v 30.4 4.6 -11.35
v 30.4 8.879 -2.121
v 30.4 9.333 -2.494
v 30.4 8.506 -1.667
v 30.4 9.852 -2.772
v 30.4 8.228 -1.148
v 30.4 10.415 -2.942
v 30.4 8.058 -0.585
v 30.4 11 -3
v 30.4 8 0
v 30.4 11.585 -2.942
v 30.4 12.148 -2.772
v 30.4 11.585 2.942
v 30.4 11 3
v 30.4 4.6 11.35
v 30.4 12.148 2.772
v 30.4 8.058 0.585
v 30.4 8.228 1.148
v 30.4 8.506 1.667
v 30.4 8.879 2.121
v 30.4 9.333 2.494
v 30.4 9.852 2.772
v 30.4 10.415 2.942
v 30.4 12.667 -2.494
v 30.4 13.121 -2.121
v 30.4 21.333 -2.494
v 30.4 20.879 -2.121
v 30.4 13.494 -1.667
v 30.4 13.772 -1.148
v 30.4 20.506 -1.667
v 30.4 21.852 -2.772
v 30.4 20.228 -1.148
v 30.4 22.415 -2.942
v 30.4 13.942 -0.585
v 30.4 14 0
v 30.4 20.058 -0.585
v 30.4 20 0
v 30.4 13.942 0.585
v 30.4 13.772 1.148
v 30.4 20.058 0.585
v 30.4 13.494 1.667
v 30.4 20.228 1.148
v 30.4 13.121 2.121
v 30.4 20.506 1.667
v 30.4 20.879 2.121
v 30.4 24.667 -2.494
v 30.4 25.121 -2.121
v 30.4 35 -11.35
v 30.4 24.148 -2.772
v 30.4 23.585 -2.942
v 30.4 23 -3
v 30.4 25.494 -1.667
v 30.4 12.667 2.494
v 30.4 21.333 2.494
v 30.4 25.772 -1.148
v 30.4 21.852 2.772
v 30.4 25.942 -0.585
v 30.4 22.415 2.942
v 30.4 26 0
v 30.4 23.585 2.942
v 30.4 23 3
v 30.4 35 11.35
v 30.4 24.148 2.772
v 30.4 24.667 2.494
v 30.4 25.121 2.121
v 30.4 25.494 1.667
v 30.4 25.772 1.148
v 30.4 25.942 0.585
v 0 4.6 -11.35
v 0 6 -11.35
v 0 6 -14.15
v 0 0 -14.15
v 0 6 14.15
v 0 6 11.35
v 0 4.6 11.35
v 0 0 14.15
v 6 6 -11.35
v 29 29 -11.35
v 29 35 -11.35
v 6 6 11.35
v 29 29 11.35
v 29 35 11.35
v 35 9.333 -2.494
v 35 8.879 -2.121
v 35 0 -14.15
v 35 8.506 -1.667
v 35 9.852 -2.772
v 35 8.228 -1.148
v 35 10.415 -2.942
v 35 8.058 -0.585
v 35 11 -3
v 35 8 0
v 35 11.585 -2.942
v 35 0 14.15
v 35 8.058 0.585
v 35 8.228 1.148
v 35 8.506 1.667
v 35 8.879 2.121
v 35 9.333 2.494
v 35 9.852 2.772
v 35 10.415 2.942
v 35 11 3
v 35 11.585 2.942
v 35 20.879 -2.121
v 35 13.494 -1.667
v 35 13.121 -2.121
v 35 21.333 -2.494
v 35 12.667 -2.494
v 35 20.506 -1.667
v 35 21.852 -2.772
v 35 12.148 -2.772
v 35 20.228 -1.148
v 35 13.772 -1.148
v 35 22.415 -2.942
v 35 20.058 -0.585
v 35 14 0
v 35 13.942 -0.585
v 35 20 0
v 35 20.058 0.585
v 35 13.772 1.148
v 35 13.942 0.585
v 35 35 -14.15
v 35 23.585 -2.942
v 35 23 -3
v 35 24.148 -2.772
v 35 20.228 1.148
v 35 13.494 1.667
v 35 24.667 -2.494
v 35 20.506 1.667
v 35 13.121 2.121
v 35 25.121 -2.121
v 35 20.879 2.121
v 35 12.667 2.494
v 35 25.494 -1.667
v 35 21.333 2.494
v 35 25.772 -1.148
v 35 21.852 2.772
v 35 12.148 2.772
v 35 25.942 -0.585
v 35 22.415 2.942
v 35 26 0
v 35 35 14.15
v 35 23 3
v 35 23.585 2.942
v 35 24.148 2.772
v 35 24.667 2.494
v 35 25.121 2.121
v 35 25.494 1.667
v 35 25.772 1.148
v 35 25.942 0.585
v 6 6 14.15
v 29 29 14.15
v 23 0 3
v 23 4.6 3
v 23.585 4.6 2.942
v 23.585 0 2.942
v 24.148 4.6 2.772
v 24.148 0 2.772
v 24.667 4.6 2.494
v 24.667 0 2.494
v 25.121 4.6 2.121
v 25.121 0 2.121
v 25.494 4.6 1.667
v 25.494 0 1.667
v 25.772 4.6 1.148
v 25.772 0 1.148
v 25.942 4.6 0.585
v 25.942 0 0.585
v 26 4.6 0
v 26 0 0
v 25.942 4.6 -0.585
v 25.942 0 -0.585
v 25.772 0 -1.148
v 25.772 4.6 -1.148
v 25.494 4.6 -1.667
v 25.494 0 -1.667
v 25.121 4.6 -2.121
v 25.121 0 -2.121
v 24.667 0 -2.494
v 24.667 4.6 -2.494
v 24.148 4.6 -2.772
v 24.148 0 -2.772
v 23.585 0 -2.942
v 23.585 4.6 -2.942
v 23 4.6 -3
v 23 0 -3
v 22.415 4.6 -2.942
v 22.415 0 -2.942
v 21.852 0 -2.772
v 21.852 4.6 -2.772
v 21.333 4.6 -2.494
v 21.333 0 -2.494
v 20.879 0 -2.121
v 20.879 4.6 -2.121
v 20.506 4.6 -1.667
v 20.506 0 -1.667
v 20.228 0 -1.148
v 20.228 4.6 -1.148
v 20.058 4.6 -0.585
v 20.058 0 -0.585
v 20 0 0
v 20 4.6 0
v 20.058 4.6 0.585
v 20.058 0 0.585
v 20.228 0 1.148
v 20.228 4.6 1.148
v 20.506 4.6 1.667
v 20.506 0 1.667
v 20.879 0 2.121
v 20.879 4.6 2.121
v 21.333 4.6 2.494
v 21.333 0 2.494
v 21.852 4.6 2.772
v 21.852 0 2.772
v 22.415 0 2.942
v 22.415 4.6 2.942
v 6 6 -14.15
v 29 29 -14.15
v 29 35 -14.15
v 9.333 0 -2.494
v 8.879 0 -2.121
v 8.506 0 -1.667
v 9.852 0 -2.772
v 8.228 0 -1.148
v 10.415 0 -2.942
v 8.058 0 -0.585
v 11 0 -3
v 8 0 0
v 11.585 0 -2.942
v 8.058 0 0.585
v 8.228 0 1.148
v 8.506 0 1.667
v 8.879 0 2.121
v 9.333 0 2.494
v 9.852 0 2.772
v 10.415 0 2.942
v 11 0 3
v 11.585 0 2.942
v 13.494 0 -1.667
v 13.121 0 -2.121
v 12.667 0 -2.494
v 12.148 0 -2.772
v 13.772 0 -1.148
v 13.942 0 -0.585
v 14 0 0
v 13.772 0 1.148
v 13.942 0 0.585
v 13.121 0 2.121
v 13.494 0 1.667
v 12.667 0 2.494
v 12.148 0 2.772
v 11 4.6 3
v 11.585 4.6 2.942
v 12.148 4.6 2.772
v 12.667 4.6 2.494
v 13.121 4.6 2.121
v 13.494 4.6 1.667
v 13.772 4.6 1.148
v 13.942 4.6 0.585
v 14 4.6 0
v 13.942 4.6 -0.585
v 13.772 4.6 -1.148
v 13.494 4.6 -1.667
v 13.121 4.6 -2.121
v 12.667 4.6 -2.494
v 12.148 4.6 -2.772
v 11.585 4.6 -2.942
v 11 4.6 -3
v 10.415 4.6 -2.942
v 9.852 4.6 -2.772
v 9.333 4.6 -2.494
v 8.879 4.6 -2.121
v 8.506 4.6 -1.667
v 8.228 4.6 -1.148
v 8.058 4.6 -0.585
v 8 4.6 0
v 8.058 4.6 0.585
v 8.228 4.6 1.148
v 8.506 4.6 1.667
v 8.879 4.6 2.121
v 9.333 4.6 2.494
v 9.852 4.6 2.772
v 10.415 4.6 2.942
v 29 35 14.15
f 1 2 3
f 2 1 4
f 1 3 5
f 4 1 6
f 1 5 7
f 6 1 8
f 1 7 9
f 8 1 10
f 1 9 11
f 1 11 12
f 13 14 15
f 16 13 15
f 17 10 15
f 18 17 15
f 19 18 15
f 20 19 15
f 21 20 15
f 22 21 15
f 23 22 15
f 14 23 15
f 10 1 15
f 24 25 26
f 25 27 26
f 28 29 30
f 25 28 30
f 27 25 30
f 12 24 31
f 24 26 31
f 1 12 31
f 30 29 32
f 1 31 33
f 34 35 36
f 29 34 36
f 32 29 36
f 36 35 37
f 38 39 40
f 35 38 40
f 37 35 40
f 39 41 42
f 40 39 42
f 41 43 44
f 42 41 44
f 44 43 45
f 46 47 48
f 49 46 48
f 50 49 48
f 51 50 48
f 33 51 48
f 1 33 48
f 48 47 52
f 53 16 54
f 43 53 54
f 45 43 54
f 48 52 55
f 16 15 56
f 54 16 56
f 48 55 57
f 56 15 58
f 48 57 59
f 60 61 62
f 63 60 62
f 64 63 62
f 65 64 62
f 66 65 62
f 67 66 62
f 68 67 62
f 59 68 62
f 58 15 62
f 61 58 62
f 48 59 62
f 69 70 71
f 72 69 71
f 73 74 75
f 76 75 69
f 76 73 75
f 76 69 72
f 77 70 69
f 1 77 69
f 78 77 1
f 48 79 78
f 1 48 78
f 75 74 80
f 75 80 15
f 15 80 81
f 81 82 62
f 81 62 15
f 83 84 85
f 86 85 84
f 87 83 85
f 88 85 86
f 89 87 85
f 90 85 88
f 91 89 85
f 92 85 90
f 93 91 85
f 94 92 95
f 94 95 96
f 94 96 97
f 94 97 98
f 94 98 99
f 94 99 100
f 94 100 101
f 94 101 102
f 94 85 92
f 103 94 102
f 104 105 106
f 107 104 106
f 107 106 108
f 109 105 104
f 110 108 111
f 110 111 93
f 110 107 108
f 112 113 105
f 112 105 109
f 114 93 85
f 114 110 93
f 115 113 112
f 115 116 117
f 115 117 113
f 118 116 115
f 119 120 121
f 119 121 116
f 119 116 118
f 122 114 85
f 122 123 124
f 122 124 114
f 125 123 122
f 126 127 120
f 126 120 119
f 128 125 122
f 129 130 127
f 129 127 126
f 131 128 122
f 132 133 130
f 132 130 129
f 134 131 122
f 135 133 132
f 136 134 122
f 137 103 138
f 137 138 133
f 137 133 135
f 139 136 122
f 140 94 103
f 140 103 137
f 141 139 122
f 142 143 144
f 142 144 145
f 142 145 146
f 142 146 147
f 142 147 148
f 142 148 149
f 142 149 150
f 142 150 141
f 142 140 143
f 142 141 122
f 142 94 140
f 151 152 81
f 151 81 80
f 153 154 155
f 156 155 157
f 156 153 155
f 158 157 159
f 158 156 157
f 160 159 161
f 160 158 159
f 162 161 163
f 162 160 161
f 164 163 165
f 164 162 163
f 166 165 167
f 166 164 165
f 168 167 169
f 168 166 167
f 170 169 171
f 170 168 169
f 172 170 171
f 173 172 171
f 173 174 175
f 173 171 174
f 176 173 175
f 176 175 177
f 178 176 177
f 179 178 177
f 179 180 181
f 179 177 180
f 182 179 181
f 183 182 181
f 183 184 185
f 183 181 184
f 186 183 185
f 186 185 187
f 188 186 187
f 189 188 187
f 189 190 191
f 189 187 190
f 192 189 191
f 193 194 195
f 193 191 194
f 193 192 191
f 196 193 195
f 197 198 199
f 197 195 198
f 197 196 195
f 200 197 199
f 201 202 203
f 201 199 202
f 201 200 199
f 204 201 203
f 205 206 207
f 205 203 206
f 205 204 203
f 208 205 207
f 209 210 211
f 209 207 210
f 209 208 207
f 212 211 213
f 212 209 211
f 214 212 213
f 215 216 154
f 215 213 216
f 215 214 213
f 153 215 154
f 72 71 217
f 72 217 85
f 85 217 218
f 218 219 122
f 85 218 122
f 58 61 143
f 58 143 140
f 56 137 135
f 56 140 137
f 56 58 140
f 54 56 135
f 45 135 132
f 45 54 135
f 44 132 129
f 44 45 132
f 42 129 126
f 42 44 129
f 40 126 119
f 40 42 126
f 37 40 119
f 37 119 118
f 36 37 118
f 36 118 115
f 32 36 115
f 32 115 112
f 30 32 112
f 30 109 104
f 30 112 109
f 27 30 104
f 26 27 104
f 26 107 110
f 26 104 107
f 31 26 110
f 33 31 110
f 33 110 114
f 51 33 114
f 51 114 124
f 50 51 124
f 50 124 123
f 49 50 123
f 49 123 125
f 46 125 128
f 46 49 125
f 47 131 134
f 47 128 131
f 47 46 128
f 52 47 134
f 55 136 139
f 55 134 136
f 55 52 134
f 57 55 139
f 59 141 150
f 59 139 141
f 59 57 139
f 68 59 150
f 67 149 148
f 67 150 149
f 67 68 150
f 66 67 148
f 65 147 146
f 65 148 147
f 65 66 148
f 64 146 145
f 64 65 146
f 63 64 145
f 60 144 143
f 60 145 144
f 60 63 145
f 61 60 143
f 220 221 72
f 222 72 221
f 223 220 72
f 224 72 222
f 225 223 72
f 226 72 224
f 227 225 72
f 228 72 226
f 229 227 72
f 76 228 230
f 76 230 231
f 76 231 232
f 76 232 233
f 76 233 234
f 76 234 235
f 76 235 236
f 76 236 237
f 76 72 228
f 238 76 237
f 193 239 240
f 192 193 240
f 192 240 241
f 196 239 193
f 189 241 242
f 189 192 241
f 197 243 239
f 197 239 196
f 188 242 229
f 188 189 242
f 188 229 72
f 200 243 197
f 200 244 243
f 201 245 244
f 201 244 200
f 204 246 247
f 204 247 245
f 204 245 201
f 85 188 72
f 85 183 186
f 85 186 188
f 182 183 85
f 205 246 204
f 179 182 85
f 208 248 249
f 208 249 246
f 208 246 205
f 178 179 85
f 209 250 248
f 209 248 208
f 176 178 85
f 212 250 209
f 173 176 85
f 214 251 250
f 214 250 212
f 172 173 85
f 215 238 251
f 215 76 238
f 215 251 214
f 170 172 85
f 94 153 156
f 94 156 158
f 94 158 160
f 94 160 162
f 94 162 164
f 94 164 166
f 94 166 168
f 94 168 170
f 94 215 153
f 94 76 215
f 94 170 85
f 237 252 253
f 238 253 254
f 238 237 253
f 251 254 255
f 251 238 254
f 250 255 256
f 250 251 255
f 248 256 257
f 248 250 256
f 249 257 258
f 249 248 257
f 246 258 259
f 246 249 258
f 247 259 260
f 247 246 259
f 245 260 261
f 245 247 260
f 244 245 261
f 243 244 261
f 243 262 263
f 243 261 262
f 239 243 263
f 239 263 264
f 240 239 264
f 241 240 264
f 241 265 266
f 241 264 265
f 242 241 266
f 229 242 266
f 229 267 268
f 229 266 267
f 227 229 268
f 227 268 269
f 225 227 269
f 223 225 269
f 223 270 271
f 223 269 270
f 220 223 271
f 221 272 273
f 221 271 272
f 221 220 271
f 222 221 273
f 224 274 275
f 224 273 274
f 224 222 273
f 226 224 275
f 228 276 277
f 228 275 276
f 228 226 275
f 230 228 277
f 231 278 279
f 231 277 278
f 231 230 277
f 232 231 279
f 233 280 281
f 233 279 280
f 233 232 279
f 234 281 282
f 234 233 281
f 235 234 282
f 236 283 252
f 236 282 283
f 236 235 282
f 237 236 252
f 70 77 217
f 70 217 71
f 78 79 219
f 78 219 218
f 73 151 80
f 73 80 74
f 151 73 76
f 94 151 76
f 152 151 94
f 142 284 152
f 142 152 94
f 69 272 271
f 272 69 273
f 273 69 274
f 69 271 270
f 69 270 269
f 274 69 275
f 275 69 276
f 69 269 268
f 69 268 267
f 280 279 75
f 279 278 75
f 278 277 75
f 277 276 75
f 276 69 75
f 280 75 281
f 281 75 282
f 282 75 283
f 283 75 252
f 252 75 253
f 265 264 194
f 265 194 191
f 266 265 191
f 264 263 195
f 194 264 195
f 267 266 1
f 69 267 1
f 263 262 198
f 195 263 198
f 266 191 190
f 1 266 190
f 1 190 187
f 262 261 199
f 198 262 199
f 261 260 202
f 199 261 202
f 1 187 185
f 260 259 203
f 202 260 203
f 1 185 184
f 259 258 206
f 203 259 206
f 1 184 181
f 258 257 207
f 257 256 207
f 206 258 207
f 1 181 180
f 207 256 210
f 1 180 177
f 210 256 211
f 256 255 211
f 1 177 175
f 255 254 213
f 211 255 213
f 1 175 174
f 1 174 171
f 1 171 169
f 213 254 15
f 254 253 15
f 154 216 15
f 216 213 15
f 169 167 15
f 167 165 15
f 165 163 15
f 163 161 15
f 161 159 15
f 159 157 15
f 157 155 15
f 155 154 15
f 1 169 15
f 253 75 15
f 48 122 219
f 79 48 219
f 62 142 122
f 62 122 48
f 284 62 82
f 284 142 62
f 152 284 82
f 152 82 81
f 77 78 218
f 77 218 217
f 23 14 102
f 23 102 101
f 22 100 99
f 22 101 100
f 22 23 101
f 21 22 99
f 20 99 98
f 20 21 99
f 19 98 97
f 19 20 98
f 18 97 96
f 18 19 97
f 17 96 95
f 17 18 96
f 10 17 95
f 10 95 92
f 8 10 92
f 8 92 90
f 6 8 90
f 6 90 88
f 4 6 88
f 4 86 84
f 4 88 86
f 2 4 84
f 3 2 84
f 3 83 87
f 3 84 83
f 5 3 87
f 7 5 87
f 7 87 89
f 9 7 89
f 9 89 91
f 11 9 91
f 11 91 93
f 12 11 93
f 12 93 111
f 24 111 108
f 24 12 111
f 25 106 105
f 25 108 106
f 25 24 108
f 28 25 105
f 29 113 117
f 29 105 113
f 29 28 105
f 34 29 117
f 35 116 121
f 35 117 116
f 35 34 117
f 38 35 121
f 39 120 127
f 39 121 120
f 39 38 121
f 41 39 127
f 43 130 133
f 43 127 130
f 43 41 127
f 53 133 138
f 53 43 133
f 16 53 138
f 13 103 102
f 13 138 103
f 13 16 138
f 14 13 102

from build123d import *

# Parameters (mm, degrees)
EXTRUDE_1_DEPTH     = 14.15
SKETCH_2_W          = 30.4
SKETCH_2_H          = 30.4
CUT_EXTRUDE_1_DEPTH = 11.35
CUT_EXTRUDE_2_REACH = 53.48
SKETCH_4_R          = 3
CUT_EXTRUDE_3_REACH = 53.48
SKETCH_5_R          = 3


with BuildPart() as part:
    # 草图1 → 凸台-拉伸1 (new, symmetric)
    with BuildSketch(Plane.XY):
        Polygon((0, 0), (35, 0), (35, 35), (29, 35), (29, 29), (6, 6), (0, 6), align=None)
    extrude(amount=EXTRUDE_1_DEPTH, both=True)

    # 草图2 → 切除-拉伸1 (cut, symmetric)
    with BuildSketch(Plane.XY):
        with Locations((15.2, 19.8)):
            Rectangle(SKETCH_2_W, SKETCH_2_H)
    extrude(amount=CUT_EXTRUDE_1_DEPTH, both=True, mode=Mode.SUBTRACT)

    # 草图4 → 切除-拉伸2 (cut, up to next)
    with BuildSketch(Plane(origin=(0, 0, 0), x_dir=(1, 0, 0), z_dir=(0, 1, 0)), mode=Mode.PRIVATE) as cut_extrude_2_sk1:
        with Locations(Location((23, 0, 0), (0, 0, 270))):
            Circle(SKETCH_4_R)
    cut_extrude_2_tool1 = extrude(cut_extrude_2_sk1.sketch, amount=CUT_EXTRUDE_2_REACH, mode=Mode.PRIVATE) & part.part
    # 草图4 → 切除-拉伸2 (cut, up to next)
    with BuildSketch(Plane(origin=(0, 0, 0), x_dir=(1, 0, 0), z_dir=(0, 1, 0)), mode=Mode.PRIVATE) as cut_extrude_2_sk2:
        with Locations(Location((11, 0, 0), (0, 0, 270))):
            Circle(SKETCH_4_R)
    cut_extrude_2_tool2 = extrude(cut_extrude_2_sk2.sketch, amount=CUT_EXTRUDE_2_REACH, mode=Mode.PRIVATE) & part.part
    add(cut_extrude_2_tool1.solids().sort_by_distance((23, 0, 0))[0], mode=Mode.SUBTRACT)
    add(cut_extrude_2_tool2.solids().sort_by_distance((11, 0, 0))[0], mode=Mode.SUBTRACT)

    # 草图5 → 切除-拉伸3 (cut, up to next)
    with BuildSketch(Plane(origin=(0, 0, 0), x_dir=(0, 0, -1), z_dir=(1, 0, 0)), mode=Mode.PRIVATE) as cut_extrude_3_sk1:
        with Locations(Location((0, 23, 0), (0, 0, 180))):
            Circle(SKETCH_5_R)
    cut_extrude_3_tool1 = extrude(cut_extrude_3_sk1.sketch, amount=CUT_EXTRUDE_3_REACH, mode=Mode.PRIVATE) & part.part
    # 草图5 → 切除-拉伸3 (cut, up to next)
    with BuildSketch(Plane(origin=(0, 0, 0), x_dir=(0, 0, -1), z_dir=(1, 0, 0)), mode=Mode.PRIVATE) as cut_extrude_3_sk2:
        with Locations(Location((0, 11, 0), (0, 0, 180))):
            Circle(SKETCH_5_R)
    cut_extrude_3_tool2 = extrude(cut_extrude_3_sk2.sketch, amount=CUT_EXTRUDE_3_REACH, mode=Mode.PRIVATE) & part.part
    add(cut_extrude_3_tool1.solids().sort_by_distance((0, 23, 0))[0], mode=Mode.SUBTRACT)
    add(cut_extrude_3_tool2.solids().sort_by_distance((0, 11, 0))[0], mode=Mode.SUBTRACT)


solid = part.part
